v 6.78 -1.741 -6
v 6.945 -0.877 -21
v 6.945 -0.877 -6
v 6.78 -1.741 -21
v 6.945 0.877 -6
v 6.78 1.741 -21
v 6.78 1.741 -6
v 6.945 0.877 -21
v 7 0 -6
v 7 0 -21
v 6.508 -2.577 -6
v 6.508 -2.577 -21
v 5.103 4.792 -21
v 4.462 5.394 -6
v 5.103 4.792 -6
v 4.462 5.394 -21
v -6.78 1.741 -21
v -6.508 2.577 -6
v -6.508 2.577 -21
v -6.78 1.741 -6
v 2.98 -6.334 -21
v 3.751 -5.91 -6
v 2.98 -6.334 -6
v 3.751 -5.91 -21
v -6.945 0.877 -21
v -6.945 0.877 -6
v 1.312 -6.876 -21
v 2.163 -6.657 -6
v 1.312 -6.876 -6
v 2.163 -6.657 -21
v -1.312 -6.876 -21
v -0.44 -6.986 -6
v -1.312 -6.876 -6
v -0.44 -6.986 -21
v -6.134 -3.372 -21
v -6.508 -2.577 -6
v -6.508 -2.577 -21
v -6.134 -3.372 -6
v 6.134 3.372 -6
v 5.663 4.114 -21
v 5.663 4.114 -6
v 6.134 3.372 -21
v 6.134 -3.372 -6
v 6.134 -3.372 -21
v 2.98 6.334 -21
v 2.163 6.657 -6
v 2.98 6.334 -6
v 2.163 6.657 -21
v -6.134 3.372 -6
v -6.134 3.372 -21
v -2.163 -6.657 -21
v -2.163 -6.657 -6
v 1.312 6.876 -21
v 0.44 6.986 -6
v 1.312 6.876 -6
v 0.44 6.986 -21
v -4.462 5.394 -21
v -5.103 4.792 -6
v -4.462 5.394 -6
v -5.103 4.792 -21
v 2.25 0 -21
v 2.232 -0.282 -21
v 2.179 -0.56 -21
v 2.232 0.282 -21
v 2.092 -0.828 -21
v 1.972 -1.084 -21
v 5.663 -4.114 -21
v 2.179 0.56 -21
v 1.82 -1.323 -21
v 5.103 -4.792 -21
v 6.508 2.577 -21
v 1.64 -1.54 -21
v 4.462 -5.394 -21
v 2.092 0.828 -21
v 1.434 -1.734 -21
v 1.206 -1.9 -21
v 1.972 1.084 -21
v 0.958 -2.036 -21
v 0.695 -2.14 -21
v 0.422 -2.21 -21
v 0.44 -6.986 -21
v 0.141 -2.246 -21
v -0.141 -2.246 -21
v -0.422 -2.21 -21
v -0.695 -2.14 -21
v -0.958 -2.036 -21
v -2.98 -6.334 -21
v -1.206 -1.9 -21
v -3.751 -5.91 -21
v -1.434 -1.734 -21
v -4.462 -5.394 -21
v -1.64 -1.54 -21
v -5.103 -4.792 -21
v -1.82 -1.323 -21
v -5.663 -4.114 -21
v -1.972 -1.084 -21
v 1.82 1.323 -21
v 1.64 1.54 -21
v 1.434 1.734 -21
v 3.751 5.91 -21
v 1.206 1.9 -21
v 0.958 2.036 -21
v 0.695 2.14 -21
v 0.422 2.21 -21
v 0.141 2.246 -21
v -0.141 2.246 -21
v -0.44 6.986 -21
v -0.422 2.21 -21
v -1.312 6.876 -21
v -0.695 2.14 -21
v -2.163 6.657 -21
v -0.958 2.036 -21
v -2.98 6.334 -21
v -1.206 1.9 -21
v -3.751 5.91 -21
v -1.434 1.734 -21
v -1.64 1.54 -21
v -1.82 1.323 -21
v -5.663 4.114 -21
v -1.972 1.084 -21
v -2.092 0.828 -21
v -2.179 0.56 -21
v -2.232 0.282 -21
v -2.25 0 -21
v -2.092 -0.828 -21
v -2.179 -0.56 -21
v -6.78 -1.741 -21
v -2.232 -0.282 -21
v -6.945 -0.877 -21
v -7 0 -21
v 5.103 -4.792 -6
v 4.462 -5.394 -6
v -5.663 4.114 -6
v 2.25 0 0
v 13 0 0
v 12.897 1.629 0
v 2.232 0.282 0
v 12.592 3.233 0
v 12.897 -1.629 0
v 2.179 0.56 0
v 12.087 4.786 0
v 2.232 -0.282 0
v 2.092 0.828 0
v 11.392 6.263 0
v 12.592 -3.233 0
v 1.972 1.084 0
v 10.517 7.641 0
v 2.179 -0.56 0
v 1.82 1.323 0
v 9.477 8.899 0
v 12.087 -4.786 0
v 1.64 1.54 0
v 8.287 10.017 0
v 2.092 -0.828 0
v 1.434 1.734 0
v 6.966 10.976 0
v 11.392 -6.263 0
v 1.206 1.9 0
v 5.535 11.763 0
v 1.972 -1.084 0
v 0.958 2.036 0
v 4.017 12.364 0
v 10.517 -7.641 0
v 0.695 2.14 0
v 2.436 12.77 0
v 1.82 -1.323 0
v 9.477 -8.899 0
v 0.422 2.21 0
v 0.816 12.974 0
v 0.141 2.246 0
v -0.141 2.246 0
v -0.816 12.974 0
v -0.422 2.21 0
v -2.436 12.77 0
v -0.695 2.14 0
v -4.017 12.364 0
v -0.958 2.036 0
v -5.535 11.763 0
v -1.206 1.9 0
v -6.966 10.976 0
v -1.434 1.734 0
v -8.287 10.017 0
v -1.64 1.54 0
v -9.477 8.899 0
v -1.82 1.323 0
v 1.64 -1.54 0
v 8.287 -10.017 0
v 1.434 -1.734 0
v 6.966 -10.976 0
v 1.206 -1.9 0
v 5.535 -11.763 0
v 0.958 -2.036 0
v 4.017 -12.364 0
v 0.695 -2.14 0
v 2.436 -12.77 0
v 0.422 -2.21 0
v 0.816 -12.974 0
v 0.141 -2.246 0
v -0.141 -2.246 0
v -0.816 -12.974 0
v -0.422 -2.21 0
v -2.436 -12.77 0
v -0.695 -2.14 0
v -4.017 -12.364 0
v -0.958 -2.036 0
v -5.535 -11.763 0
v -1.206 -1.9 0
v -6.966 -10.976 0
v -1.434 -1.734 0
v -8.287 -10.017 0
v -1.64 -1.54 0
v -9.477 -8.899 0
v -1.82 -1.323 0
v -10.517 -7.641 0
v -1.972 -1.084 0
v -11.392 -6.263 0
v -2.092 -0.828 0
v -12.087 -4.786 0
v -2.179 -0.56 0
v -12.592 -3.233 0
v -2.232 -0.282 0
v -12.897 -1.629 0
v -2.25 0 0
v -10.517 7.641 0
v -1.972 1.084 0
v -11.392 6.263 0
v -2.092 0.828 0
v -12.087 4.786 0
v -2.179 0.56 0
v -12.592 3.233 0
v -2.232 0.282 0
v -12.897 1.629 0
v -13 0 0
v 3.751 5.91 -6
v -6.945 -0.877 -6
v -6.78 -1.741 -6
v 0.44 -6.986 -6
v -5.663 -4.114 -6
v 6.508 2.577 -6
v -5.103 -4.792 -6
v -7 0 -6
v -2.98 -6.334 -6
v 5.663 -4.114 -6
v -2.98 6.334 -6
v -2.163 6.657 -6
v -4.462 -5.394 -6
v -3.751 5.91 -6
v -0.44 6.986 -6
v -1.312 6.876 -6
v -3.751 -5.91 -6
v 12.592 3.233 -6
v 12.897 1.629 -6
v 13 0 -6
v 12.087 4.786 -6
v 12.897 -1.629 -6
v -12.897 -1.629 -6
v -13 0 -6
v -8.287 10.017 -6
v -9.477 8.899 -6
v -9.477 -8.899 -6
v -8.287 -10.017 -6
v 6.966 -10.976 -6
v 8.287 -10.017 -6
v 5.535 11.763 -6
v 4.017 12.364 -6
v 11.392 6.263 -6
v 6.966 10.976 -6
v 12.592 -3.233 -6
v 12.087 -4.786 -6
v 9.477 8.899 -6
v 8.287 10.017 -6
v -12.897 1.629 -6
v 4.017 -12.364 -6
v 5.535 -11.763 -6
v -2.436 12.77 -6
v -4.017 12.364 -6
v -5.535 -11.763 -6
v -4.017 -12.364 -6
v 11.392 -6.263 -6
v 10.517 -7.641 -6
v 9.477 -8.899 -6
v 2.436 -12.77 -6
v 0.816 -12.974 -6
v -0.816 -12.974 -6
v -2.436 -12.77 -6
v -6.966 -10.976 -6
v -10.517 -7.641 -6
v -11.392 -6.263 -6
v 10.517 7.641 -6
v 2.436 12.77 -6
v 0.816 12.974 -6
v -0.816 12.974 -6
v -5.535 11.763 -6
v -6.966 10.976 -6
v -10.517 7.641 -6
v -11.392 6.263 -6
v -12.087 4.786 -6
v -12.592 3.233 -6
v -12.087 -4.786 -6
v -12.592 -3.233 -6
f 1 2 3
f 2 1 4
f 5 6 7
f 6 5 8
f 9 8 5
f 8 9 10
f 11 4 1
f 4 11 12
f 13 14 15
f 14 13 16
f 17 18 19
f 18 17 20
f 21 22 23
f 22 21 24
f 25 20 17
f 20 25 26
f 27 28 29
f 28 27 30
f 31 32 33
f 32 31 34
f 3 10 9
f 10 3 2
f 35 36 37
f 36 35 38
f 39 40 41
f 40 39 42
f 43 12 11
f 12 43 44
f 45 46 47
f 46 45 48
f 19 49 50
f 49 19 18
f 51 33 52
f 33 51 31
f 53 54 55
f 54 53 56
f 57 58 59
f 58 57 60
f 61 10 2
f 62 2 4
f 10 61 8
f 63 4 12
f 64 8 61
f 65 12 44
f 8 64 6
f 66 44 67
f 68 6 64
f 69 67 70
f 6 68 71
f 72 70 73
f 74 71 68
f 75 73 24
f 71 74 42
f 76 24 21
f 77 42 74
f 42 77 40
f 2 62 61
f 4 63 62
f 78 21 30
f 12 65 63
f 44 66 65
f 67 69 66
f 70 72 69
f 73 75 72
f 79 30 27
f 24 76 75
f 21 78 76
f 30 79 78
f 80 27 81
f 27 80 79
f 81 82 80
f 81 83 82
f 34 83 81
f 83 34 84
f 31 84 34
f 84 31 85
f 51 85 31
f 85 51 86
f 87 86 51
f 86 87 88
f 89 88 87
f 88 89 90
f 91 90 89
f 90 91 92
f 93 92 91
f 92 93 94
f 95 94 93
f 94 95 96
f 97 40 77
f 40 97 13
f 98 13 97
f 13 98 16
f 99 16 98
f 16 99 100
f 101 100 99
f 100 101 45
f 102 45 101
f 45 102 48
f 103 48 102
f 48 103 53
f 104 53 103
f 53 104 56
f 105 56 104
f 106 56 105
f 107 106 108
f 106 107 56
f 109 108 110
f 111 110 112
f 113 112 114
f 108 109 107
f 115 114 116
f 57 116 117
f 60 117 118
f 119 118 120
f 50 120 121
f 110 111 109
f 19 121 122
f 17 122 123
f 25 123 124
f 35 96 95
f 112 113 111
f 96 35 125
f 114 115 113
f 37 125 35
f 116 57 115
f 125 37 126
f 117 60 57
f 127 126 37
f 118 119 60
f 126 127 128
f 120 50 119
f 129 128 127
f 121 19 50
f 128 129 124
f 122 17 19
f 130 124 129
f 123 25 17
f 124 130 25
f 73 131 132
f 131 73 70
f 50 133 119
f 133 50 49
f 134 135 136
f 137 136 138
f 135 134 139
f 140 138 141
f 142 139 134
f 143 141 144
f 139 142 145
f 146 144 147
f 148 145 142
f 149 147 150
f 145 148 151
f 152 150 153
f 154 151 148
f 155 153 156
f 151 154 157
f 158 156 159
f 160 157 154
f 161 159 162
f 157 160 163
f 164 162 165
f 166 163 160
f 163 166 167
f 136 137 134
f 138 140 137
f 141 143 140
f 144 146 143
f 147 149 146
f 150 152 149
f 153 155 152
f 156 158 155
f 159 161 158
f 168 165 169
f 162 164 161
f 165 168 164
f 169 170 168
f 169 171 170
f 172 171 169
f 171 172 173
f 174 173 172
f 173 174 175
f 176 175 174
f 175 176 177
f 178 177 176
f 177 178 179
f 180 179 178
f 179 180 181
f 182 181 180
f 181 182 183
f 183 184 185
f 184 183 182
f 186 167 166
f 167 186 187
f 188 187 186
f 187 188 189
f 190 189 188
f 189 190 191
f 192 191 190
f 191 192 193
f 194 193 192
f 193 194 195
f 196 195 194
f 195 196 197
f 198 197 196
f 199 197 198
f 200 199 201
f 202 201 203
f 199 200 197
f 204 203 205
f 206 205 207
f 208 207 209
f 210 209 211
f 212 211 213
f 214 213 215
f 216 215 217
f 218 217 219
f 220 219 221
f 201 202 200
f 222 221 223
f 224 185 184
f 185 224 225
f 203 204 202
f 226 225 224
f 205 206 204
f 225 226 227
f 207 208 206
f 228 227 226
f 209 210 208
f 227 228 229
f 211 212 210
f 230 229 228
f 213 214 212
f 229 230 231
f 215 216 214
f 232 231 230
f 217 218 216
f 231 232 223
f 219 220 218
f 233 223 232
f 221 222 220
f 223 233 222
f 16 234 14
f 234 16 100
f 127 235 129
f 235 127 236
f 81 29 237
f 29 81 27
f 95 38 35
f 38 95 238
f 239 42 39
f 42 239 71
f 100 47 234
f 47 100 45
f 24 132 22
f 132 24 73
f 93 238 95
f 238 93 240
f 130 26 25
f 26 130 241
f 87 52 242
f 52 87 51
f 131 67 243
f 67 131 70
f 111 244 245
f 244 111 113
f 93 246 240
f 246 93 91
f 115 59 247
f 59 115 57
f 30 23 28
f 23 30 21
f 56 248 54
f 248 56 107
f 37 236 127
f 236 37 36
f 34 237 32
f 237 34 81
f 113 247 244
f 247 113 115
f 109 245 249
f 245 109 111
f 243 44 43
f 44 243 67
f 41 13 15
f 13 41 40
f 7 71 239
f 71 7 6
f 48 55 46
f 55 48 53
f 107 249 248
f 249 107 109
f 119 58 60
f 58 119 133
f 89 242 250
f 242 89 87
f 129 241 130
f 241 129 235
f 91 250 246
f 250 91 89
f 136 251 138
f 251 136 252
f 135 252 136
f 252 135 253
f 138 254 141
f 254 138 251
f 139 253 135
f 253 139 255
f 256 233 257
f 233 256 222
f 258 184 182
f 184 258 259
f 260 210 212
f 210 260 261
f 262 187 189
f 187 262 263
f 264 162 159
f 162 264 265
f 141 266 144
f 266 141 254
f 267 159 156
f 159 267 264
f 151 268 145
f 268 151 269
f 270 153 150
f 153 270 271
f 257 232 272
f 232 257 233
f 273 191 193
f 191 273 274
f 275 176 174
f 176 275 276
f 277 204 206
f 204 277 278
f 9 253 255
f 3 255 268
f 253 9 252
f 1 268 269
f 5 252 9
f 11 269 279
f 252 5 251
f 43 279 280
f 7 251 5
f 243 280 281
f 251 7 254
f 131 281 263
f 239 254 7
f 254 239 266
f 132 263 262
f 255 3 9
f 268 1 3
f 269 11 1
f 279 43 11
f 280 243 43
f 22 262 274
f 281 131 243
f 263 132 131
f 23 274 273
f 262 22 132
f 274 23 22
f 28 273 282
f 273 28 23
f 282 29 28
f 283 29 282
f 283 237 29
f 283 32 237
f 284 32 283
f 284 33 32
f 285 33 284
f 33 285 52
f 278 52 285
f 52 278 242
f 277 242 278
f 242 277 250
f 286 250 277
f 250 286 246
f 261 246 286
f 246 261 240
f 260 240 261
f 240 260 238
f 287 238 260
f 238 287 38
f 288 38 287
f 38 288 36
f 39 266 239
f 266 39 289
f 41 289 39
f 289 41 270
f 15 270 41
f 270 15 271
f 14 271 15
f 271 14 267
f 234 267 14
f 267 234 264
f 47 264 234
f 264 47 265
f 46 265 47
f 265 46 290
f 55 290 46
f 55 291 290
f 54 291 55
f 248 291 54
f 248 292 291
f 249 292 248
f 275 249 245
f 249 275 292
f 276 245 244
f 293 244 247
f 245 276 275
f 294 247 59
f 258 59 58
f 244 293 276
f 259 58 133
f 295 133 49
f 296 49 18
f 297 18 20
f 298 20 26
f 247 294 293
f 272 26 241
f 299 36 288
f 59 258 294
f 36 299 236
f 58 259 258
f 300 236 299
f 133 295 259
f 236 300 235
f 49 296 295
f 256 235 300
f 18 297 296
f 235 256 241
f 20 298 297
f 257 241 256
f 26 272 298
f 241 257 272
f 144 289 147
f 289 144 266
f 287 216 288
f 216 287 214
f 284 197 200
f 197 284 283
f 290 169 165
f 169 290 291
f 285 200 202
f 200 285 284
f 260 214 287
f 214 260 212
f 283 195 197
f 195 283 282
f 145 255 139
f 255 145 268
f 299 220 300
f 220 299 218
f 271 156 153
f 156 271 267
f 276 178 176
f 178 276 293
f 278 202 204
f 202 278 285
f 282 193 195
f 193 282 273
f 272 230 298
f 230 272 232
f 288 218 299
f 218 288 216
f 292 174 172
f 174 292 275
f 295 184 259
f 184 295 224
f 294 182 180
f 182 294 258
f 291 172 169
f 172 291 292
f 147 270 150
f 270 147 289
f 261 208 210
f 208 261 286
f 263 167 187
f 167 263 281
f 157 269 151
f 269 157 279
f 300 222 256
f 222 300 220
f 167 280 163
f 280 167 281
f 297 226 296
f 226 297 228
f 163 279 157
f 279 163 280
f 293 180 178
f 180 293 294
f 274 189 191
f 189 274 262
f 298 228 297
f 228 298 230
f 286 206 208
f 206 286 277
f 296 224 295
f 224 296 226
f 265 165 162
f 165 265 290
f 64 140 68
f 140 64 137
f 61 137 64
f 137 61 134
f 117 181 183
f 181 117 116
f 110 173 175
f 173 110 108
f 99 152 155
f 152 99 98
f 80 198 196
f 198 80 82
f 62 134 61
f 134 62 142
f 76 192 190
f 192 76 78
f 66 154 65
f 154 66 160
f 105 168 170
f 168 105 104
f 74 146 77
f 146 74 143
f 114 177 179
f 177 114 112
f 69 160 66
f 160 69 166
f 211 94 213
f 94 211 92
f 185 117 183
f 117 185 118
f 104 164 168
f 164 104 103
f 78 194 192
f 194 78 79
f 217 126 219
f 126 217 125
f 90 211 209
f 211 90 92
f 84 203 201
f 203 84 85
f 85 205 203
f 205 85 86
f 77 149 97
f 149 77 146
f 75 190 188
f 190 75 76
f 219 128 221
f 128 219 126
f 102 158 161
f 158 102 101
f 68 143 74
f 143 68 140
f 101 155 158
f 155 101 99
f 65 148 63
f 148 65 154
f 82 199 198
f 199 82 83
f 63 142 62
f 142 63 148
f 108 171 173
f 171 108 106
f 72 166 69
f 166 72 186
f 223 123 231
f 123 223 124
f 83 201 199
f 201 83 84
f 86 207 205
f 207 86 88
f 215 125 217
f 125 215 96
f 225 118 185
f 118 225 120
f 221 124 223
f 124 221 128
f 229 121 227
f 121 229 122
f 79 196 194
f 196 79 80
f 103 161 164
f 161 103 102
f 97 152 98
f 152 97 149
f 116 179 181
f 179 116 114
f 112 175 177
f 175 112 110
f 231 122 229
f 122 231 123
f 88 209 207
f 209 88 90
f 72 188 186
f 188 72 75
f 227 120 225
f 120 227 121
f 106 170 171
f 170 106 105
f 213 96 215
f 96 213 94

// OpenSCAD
$fn = 50;


difference() {
	union() {
		translate(v = [0, 0, -21.0000000000]) {
			cylinder(h = 21, r = 7.0000000000);
		}
		translate(v = [0, 0, -6.0000000000]) {
			cylinder(h = 6, r = 13.0000000000);
		}
	}
	union() {
		#translate(v = [0, 0, -21]) {
			cylinder(h = 21, r = 2.2500000000);
		}
	}
}
